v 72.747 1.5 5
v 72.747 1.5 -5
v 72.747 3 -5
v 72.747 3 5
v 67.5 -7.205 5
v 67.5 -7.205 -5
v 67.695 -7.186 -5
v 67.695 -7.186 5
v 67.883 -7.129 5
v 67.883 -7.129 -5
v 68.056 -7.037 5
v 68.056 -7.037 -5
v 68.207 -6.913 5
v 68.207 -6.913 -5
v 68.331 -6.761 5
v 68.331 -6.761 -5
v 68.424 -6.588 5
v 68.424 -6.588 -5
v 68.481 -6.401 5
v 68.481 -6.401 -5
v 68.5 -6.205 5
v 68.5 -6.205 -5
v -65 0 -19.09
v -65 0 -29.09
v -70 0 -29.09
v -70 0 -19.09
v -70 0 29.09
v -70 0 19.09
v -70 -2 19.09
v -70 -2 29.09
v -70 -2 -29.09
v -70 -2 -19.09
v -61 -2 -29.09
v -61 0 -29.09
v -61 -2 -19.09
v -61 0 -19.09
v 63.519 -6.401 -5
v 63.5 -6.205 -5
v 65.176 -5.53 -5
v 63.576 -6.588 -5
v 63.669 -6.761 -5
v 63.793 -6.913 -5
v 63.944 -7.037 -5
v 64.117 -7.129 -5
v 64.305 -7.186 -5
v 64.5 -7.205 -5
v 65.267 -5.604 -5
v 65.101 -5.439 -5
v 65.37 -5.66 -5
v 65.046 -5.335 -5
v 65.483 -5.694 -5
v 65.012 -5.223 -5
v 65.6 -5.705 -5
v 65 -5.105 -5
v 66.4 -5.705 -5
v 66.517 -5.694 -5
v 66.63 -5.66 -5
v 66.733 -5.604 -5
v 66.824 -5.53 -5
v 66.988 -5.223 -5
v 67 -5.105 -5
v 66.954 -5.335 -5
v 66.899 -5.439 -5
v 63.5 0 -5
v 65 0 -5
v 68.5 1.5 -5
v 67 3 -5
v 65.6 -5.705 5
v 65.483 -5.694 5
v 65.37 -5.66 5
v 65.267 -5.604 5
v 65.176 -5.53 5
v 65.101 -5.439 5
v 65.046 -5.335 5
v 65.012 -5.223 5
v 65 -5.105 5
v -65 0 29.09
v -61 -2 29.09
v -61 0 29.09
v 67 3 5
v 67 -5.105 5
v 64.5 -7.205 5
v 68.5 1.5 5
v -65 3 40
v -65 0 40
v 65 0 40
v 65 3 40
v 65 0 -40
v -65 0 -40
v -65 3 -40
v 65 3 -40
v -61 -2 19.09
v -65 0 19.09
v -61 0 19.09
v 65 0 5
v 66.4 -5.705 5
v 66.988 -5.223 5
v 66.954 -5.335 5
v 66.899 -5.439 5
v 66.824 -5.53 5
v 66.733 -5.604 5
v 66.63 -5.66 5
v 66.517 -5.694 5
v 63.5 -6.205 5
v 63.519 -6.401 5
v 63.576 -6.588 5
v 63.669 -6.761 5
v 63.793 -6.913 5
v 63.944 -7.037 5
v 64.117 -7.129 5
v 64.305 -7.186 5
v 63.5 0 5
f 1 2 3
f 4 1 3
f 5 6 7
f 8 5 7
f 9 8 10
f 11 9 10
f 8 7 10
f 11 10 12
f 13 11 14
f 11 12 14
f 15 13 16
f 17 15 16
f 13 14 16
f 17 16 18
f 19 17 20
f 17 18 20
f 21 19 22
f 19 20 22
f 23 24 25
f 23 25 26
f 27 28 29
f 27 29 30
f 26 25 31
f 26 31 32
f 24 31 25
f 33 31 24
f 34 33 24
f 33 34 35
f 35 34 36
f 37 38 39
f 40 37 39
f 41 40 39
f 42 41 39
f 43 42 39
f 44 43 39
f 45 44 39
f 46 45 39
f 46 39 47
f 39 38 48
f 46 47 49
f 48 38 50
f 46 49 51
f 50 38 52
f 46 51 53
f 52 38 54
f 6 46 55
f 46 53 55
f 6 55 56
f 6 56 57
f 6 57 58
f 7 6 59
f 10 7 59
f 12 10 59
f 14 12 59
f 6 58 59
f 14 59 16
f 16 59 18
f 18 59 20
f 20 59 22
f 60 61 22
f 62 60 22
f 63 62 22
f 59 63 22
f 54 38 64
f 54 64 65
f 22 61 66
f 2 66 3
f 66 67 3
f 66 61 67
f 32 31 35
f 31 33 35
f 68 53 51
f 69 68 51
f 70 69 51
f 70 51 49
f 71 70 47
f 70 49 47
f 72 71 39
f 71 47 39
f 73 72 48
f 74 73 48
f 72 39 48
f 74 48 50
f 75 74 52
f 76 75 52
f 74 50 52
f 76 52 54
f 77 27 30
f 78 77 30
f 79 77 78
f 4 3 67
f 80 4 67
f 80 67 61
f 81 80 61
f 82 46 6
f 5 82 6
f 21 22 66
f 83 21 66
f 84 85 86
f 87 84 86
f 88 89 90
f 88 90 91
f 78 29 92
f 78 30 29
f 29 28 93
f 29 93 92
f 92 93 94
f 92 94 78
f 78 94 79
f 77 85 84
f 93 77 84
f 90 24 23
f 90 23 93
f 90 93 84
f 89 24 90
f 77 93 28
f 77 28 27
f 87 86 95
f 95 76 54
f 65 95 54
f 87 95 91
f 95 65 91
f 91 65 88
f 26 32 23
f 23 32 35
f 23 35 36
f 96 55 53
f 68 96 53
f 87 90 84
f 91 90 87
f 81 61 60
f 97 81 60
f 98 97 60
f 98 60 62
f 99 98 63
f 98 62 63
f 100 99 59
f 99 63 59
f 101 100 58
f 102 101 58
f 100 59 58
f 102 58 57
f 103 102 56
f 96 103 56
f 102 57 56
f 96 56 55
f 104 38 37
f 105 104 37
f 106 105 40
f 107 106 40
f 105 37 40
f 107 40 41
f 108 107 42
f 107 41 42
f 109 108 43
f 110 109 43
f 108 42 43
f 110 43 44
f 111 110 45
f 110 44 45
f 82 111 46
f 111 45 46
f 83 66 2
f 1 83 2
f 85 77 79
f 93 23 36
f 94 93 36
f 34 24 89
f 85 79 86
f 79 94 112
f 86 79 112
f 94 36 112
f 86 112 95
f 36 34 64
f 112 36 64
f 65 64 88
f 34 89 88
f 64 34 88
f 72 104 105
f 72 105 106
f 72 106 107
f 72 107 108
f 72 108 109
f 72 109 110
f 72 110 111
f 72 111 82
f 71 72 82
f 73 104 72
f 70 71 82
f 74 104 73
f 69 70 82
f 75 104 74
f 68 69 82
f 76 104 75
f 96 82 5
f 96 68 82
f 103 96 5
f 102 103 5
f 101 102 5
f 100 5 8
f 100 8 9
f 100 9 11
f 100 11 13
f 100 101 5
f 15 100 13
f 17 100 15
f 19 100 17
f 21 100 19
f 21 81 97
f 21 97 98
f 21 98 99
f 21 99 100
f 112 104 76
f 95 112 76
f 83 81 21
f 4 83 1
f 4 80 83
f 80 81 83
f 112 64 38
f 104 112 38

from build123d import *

# Parameters (mm, degrees)
SKETCH1_W                = 130
SKETCH1_H                = 80
BOSS_EXTRUDE1_DEPTH      = 3
BOSS_EXTRUDE2_DEPTH      = 5
BOSS_EXTRUDE2_DEPTH_BACK = 5
SKETCH3_W                = 4
SKETCH3_H                = 10
BOSS_EXTRUDE3_DEPTH      = 2
SKETCH4_W                = 10
SKETCH4_H                = 2
BOSS_EXTRUDE4_DEPTH      = 5


with BuildPart() as part:
    # Sketch1 → Boss-Extrude1 (new body)
    with BuildSketch(Plane(origin=(0, 0, 0), x_dir=(1, 0, 0), z_dir=(0, 1, 0))):
        Rectangle(SKETCH1_W, SKETCH1_H)
    extrude(amount=BOSS_EXTRUDE1_DEPTH)

    # Sketch2 → Boss-Extrude2 (add, two sides: drawn at the far end of the back side and taken through both)
    with BuildSketch(Plane.XY.offset(-BOSS_EXTRUDE2_DEPTH_BACK)):
        with BuildLine():
            Line((63.5, 1.5), (63.5, -6.205455333))
            ThreePointArc((63.5, -6.205455333), (63.792893219, -6.912562114), (64.5, -7.205455333))
            Line((64.5, -7.205455333), (67.5, -7.205455333))
            ThreePointArc((67.5, -7.205455333), (68.207106781, -6.912562114), (68.5, -6.205455333))
            Line((68.5, -6.205455333), (68.5, 1.5))
            Line((68.5, 1.5), (72.74730308, 1.5))
            Line((72.74730308, 1.5), (72.74730308, 3))
            Line((72.74730308, 3), (67, 3))
            Line((67, 3), (67, -5.105455333))
            ThreePointArc((67, -5.105455333), (66.824264069, -5.529719402), (66.4, -5.705455333))
            Line((66.4, -5.705455333), (65.6, -5.705455333))
            ThreePointArc((65.6, -5.705455333), (65.175735931, -5.529719402), (65, -5.105455333))
            Line((65, -5.105455333), (65, 1.5))
            Line((65, 1.5), (63.5, 1.5))
        make_face()
    extrude(amount=BOSS_EXTRUDE2_DEPTH + BOSS_EXTRUDE2_DEPTH_BACK)

    # Sketch3 → Boss-Extrude3 (add)
    with BuildSketch(Plane.XZ):
        with Locations((-63, 24.089900089)):
            Rectangle(SKETCH3_W, SKETCH3_H)
        with Locations((-63, -24.089900089)):
            Rectangle(SKETCH3_W, SKETCH3_H)
    extrude(amount=BOSS_EXTRUDE3_DEPTH)

    # Sketch4 → Boss-Extrude4 (add)
    with BuildSketch(Plane.ZY.offset(65)):
        with Locations((-24.089900089, -1)):
            Rectangle(SKETCH4_W, SKETCH4_H)
        with Locations((24.089900089, -1)):
            Rectangle(SKETCH4_W, SKETCH4_H)
    extrude(amount=BOSS_EXTRUDE4_DEPTH)


solid = part.part
